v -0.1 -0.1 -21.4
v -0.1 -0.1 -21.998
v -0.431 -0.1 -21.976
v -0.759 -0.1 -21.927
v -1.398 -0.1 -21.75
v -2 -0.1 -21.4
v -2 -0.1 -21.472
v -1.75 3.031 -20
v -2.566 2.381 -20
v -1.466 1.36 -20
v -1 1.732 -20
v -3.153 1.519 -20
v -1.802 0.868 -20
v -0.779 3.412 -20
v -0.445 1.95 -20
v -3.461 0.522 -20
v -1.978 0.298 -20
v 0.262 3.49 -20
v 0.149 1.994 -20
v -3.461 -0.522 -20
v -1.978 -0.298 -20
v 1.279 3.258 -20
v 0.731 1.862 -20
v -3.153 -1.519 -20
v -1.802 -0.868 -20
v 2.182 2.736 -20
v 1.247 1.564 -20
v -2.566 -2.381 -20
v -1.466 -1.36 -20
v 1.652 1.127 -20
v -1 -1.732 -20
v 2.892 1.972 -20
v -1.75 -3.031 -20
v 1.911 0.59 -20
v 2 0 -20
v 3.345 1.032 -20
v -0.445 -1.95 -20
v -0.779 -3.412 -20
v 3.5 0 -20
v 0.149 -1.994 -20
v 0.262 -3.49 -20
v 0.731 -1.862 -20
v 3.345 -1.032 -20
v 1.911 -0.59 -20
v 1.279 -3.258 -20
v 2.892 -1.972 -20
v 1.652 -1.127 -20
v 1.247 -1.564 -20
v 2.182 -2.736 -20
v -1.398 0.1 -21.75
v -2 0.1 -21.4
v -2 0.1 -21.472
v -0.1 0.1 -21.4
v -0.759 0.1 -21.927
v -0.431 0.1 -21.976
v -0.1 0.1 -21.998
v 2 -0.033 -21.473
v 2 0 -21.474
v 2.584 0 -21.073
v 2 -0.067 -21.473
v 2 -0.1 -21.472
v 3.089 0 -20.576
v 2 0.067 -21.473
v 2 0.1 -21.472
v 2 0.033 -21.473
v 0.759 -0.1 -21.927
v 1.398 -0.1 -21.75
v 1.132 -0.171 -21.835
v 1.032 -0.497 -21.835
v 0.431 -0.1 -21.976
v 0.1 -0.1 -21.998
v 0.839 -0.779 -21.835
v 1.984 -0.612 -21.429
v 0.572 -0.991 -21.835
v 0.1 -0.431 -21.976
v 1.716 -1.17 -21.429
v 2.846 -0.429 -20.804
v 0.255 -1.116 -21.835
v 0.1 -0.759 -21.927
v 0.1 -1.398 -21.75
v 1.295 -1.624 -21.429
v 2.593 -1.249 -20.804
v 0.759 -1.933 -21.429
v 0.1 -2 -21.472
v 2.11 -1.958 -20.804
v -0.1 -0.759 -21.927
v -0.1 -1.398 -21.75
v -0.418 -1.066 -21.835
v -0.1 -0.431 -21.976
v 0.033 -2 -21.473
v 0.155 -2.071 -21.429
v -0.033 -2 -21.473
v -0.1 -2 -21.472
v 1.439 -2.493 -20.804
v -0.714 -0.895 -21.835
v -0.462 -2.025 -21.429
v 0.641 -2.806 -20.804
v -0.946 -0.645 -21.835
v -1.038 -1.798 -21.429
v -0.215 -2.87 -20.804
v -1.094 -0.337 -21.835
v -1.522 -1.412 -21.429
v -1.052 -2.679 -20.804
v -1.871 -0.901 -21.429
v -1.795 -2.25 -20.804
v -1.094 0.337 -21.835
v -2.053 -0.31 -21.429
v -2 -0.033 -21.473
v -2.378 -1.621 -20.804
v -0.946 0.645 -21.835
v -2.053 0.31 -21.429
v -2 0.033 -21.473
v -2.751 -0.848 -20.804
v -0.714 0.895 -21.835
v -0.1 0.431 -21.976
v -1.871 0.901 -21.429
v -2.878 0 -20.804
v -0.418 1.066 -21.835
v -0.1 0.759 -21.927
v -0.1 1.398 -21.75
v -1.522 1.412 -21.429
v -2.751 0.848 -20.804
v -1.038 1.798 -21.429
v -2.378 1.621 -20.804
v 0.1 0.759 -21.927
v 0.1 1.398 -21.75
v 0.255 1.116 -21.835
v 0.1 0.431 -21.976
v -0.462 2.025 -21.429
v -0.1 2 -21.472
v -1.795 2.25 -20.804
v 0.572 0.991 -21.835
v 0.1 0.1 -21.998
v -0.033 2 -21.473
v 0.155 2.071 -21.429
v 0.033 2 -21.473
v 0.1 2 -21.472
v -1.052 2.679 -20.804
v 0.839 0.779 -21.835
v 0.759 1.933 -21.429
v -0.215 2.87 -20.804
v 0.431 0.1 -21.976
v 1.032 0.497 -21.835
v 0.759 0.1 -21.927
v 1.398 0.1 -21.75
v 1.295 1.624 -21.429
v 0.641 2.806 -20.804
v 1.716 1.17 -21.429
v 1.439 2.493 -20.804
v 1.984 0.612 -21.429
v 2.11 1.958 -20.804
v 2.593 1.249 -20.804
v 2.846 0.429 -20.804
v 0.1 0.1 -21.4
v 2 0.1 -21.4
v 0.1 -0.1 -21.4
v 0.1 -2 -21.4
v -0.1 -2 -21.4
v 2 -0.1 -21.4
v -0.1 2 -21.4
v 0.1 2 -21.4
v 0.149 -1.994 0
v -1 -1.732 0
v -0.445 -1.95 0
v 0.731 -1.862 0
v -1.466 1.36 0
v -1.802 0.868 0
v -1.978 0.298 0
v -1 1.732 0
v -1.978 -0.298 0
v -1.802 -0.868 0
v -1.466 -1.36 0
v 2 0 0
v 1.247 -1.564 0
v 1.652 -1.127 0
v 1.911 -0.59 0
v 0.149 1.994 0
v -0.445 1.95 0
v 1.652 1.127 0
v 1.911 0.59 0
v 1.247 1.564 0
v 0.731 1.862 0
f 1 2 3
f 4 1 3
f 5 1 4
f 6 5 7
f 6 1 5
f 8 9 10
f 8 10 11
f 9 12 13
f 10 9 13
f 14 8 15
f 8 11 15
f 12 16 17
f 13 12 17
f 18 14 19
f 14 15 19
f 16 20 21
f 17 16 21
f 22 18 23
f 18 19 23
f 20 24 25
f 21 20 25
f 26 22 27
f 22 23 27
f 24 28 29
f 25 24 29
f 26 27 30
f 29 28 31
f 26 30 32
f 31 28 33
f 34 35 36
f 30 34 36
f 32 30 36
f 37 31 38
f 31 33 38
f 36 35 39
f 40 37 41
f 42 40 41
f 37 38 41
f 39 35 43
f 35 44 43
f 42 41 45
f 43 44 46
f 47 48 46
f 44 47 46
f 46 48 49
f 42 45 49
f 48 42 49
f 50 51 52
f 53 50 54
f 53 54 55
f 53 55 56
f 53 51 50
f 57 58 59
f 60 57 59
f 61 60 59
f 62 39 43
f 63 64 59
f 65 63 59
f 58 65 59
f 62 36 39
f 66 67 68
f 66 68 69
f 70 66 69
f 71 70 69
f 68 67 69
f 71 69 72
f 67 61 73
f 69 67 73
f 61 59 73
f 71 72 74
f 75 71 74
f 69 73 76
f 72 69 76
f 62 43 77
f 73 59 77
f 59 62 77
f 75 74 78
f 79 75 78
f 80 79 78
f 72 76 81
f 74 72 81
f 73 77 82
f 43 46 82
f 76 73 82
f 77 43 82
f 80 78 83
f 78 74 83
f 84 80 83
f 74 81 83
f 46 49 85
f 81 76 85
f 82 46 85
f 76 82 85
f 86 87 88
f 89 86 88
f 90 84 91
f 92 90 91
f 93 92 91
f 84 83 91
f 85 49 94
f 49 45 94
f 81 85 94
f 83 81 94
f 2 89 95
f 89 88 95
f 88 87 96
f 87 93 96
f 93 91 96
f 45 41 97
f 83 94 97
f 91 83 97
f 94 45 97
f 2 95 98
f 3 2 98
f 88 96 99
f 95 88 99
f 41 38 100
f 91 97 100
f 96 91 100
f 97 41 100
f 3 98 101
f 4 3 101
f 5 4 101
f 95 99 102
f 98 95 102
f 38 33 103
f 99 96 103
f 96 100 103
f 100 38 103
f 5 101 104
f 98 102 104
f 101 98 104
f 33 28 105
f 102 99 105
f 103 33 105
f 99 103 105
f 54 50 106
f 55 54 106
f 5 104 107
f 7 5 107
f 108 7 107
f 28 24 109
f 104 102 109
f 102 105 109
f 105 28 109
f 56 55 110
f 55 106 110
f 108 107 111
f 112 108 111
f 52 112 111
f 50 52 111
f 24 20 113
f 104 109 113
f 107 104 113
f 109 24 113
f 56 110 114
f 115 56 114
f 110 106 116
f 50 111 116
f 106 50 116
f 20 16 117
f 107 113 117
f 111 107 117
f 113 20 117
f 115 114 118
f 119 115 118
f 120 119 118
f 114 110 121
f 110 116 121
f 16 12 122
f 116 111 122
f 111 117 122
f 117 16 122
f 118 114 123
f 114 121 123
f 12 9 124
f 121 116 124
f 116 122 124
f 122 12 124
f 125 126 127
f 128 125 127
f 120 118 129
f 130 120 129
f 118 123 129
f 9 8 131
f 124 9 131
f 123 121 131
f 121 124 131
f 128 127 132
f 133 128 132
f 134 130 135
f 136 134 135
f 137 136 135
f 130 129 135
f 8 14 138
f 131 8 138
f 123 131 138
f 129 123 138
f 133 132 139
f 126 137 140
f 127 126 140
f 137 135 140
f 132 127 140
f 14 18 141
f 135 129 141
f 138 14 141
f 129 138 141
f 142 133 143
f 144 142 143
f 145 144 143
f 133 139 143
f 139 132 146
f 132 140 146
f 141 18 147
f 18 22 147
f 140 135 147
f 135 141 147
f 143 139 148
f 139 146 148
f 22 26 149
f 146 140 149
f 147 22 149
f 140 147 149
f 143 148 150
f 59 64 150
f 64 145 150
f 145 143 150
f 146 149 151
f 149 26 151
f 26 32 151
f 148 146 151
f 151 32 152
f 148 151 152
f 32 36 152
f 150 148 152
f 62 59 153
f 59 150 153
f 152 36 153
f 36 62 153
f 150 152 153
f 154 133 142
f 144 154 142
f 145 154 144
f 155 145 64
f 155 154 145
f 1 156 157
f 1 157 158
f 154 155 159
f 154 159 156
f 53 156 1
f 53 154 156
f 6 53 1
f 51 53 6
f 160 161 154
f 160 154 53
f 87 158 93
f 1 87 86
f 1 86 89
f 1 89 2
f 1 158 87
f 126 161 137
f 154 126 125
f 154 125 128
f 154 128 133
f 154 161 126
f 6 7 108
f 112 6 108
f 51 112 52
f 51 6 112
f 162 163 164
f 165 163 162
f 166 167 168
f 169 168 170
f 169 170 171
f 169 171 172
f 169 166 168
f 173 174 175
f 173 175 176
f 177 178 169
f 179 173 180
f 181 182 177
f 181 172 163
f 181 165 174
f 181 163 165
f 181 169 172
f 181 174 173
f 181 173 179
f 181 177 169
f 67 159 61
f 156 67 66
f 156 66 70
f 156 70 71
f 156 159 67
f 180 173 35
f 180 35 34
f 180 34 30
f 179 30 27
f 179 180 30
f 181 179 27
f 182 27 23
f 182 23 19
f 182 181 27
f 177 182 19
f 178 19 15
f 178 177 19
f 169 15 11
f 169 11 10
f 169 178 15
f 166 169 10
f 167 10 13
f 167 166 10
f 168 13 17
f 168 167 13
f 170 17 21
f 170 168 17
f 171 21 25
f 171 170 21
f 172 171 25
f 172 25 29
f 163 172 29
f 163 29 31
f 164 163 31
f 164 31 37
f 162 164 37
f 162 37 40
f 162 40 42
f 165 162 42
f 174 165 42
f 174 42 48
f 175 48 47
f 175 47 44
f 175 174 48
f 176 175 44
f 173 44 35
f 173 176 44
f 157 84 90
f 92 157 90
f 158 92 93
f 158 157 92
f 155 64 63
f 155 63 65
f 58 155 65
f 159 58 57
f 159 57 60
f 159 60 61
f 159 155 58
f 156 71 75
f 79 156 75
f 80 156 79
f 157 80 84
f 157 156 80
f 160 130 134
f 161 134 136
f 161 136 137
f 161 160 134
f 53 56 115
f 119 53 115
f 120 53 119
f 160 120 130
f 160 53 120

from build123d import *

# Parameters (mm, degrees)
CROQUIS2_R                   = 2
SALIENTE_EXTRUIR1_DEPTH      = 20
CORTAR_EXTRUIR_L_MINA2_START = -0.6
CORTAR_EXTRUIR_L_MINA2_DEPTH = 0.6


# Read off the part's stored shape, not the designer's step: Cortar-Extruir-Lámina2
with BuildPart() as part:
    # Croquis2 → Saliente-Extruir1 (new body)
    with BuildSketch(Plane.XY):
        Circle(CROQUIS2_R)
    extrude(amount=-SALIENTE_EXTRUIR1_DEPTH)

    # Croquis4 → Revolución1 (revolve)
    with BuildSketch(Plane(origin=(0, 0, 0), x_dir=(1, 0, 0), z_dir=(0, 1, 0))):
        with BuildLine():
            Line((3.5, 20), (0, 20))
            Line((0, 20), (0, 22))
            ThreePointArc((0, 22), (2.015564437, 21.464737765), (3.5, 20))
        make_face()
    revolve(axis=Axis((0, 0, -20), (0, 0, -1)))

    # Cortar-Extruir-Lámina2 outline → Cortar-Extruir-Lámina2 (cut)
    with BuildSketch(Plane(origin=(0, 0, -22), x_dir=(-1, 0, 0), z_dir=(0, 0, -1)).offset(CORTAR_EXTRUIR_L_MINA2_START)):
        Polygon((0.1, -2), (0.1, -0.1), (2, -0.1), (2, 0.1), (0.1, 0.1), (0.1, 2), (-0.1, 2), (-0.1, 0.1), (-2, 0.1), (-2, -0.1), (-0.1, -0.1), (-0.1, -2), align=None)
    extrude(amount=CORTAR_EXTRUIR_L_MINA2_DEPTH, mode=Mode.SUBTRACT)


solid = part.part
